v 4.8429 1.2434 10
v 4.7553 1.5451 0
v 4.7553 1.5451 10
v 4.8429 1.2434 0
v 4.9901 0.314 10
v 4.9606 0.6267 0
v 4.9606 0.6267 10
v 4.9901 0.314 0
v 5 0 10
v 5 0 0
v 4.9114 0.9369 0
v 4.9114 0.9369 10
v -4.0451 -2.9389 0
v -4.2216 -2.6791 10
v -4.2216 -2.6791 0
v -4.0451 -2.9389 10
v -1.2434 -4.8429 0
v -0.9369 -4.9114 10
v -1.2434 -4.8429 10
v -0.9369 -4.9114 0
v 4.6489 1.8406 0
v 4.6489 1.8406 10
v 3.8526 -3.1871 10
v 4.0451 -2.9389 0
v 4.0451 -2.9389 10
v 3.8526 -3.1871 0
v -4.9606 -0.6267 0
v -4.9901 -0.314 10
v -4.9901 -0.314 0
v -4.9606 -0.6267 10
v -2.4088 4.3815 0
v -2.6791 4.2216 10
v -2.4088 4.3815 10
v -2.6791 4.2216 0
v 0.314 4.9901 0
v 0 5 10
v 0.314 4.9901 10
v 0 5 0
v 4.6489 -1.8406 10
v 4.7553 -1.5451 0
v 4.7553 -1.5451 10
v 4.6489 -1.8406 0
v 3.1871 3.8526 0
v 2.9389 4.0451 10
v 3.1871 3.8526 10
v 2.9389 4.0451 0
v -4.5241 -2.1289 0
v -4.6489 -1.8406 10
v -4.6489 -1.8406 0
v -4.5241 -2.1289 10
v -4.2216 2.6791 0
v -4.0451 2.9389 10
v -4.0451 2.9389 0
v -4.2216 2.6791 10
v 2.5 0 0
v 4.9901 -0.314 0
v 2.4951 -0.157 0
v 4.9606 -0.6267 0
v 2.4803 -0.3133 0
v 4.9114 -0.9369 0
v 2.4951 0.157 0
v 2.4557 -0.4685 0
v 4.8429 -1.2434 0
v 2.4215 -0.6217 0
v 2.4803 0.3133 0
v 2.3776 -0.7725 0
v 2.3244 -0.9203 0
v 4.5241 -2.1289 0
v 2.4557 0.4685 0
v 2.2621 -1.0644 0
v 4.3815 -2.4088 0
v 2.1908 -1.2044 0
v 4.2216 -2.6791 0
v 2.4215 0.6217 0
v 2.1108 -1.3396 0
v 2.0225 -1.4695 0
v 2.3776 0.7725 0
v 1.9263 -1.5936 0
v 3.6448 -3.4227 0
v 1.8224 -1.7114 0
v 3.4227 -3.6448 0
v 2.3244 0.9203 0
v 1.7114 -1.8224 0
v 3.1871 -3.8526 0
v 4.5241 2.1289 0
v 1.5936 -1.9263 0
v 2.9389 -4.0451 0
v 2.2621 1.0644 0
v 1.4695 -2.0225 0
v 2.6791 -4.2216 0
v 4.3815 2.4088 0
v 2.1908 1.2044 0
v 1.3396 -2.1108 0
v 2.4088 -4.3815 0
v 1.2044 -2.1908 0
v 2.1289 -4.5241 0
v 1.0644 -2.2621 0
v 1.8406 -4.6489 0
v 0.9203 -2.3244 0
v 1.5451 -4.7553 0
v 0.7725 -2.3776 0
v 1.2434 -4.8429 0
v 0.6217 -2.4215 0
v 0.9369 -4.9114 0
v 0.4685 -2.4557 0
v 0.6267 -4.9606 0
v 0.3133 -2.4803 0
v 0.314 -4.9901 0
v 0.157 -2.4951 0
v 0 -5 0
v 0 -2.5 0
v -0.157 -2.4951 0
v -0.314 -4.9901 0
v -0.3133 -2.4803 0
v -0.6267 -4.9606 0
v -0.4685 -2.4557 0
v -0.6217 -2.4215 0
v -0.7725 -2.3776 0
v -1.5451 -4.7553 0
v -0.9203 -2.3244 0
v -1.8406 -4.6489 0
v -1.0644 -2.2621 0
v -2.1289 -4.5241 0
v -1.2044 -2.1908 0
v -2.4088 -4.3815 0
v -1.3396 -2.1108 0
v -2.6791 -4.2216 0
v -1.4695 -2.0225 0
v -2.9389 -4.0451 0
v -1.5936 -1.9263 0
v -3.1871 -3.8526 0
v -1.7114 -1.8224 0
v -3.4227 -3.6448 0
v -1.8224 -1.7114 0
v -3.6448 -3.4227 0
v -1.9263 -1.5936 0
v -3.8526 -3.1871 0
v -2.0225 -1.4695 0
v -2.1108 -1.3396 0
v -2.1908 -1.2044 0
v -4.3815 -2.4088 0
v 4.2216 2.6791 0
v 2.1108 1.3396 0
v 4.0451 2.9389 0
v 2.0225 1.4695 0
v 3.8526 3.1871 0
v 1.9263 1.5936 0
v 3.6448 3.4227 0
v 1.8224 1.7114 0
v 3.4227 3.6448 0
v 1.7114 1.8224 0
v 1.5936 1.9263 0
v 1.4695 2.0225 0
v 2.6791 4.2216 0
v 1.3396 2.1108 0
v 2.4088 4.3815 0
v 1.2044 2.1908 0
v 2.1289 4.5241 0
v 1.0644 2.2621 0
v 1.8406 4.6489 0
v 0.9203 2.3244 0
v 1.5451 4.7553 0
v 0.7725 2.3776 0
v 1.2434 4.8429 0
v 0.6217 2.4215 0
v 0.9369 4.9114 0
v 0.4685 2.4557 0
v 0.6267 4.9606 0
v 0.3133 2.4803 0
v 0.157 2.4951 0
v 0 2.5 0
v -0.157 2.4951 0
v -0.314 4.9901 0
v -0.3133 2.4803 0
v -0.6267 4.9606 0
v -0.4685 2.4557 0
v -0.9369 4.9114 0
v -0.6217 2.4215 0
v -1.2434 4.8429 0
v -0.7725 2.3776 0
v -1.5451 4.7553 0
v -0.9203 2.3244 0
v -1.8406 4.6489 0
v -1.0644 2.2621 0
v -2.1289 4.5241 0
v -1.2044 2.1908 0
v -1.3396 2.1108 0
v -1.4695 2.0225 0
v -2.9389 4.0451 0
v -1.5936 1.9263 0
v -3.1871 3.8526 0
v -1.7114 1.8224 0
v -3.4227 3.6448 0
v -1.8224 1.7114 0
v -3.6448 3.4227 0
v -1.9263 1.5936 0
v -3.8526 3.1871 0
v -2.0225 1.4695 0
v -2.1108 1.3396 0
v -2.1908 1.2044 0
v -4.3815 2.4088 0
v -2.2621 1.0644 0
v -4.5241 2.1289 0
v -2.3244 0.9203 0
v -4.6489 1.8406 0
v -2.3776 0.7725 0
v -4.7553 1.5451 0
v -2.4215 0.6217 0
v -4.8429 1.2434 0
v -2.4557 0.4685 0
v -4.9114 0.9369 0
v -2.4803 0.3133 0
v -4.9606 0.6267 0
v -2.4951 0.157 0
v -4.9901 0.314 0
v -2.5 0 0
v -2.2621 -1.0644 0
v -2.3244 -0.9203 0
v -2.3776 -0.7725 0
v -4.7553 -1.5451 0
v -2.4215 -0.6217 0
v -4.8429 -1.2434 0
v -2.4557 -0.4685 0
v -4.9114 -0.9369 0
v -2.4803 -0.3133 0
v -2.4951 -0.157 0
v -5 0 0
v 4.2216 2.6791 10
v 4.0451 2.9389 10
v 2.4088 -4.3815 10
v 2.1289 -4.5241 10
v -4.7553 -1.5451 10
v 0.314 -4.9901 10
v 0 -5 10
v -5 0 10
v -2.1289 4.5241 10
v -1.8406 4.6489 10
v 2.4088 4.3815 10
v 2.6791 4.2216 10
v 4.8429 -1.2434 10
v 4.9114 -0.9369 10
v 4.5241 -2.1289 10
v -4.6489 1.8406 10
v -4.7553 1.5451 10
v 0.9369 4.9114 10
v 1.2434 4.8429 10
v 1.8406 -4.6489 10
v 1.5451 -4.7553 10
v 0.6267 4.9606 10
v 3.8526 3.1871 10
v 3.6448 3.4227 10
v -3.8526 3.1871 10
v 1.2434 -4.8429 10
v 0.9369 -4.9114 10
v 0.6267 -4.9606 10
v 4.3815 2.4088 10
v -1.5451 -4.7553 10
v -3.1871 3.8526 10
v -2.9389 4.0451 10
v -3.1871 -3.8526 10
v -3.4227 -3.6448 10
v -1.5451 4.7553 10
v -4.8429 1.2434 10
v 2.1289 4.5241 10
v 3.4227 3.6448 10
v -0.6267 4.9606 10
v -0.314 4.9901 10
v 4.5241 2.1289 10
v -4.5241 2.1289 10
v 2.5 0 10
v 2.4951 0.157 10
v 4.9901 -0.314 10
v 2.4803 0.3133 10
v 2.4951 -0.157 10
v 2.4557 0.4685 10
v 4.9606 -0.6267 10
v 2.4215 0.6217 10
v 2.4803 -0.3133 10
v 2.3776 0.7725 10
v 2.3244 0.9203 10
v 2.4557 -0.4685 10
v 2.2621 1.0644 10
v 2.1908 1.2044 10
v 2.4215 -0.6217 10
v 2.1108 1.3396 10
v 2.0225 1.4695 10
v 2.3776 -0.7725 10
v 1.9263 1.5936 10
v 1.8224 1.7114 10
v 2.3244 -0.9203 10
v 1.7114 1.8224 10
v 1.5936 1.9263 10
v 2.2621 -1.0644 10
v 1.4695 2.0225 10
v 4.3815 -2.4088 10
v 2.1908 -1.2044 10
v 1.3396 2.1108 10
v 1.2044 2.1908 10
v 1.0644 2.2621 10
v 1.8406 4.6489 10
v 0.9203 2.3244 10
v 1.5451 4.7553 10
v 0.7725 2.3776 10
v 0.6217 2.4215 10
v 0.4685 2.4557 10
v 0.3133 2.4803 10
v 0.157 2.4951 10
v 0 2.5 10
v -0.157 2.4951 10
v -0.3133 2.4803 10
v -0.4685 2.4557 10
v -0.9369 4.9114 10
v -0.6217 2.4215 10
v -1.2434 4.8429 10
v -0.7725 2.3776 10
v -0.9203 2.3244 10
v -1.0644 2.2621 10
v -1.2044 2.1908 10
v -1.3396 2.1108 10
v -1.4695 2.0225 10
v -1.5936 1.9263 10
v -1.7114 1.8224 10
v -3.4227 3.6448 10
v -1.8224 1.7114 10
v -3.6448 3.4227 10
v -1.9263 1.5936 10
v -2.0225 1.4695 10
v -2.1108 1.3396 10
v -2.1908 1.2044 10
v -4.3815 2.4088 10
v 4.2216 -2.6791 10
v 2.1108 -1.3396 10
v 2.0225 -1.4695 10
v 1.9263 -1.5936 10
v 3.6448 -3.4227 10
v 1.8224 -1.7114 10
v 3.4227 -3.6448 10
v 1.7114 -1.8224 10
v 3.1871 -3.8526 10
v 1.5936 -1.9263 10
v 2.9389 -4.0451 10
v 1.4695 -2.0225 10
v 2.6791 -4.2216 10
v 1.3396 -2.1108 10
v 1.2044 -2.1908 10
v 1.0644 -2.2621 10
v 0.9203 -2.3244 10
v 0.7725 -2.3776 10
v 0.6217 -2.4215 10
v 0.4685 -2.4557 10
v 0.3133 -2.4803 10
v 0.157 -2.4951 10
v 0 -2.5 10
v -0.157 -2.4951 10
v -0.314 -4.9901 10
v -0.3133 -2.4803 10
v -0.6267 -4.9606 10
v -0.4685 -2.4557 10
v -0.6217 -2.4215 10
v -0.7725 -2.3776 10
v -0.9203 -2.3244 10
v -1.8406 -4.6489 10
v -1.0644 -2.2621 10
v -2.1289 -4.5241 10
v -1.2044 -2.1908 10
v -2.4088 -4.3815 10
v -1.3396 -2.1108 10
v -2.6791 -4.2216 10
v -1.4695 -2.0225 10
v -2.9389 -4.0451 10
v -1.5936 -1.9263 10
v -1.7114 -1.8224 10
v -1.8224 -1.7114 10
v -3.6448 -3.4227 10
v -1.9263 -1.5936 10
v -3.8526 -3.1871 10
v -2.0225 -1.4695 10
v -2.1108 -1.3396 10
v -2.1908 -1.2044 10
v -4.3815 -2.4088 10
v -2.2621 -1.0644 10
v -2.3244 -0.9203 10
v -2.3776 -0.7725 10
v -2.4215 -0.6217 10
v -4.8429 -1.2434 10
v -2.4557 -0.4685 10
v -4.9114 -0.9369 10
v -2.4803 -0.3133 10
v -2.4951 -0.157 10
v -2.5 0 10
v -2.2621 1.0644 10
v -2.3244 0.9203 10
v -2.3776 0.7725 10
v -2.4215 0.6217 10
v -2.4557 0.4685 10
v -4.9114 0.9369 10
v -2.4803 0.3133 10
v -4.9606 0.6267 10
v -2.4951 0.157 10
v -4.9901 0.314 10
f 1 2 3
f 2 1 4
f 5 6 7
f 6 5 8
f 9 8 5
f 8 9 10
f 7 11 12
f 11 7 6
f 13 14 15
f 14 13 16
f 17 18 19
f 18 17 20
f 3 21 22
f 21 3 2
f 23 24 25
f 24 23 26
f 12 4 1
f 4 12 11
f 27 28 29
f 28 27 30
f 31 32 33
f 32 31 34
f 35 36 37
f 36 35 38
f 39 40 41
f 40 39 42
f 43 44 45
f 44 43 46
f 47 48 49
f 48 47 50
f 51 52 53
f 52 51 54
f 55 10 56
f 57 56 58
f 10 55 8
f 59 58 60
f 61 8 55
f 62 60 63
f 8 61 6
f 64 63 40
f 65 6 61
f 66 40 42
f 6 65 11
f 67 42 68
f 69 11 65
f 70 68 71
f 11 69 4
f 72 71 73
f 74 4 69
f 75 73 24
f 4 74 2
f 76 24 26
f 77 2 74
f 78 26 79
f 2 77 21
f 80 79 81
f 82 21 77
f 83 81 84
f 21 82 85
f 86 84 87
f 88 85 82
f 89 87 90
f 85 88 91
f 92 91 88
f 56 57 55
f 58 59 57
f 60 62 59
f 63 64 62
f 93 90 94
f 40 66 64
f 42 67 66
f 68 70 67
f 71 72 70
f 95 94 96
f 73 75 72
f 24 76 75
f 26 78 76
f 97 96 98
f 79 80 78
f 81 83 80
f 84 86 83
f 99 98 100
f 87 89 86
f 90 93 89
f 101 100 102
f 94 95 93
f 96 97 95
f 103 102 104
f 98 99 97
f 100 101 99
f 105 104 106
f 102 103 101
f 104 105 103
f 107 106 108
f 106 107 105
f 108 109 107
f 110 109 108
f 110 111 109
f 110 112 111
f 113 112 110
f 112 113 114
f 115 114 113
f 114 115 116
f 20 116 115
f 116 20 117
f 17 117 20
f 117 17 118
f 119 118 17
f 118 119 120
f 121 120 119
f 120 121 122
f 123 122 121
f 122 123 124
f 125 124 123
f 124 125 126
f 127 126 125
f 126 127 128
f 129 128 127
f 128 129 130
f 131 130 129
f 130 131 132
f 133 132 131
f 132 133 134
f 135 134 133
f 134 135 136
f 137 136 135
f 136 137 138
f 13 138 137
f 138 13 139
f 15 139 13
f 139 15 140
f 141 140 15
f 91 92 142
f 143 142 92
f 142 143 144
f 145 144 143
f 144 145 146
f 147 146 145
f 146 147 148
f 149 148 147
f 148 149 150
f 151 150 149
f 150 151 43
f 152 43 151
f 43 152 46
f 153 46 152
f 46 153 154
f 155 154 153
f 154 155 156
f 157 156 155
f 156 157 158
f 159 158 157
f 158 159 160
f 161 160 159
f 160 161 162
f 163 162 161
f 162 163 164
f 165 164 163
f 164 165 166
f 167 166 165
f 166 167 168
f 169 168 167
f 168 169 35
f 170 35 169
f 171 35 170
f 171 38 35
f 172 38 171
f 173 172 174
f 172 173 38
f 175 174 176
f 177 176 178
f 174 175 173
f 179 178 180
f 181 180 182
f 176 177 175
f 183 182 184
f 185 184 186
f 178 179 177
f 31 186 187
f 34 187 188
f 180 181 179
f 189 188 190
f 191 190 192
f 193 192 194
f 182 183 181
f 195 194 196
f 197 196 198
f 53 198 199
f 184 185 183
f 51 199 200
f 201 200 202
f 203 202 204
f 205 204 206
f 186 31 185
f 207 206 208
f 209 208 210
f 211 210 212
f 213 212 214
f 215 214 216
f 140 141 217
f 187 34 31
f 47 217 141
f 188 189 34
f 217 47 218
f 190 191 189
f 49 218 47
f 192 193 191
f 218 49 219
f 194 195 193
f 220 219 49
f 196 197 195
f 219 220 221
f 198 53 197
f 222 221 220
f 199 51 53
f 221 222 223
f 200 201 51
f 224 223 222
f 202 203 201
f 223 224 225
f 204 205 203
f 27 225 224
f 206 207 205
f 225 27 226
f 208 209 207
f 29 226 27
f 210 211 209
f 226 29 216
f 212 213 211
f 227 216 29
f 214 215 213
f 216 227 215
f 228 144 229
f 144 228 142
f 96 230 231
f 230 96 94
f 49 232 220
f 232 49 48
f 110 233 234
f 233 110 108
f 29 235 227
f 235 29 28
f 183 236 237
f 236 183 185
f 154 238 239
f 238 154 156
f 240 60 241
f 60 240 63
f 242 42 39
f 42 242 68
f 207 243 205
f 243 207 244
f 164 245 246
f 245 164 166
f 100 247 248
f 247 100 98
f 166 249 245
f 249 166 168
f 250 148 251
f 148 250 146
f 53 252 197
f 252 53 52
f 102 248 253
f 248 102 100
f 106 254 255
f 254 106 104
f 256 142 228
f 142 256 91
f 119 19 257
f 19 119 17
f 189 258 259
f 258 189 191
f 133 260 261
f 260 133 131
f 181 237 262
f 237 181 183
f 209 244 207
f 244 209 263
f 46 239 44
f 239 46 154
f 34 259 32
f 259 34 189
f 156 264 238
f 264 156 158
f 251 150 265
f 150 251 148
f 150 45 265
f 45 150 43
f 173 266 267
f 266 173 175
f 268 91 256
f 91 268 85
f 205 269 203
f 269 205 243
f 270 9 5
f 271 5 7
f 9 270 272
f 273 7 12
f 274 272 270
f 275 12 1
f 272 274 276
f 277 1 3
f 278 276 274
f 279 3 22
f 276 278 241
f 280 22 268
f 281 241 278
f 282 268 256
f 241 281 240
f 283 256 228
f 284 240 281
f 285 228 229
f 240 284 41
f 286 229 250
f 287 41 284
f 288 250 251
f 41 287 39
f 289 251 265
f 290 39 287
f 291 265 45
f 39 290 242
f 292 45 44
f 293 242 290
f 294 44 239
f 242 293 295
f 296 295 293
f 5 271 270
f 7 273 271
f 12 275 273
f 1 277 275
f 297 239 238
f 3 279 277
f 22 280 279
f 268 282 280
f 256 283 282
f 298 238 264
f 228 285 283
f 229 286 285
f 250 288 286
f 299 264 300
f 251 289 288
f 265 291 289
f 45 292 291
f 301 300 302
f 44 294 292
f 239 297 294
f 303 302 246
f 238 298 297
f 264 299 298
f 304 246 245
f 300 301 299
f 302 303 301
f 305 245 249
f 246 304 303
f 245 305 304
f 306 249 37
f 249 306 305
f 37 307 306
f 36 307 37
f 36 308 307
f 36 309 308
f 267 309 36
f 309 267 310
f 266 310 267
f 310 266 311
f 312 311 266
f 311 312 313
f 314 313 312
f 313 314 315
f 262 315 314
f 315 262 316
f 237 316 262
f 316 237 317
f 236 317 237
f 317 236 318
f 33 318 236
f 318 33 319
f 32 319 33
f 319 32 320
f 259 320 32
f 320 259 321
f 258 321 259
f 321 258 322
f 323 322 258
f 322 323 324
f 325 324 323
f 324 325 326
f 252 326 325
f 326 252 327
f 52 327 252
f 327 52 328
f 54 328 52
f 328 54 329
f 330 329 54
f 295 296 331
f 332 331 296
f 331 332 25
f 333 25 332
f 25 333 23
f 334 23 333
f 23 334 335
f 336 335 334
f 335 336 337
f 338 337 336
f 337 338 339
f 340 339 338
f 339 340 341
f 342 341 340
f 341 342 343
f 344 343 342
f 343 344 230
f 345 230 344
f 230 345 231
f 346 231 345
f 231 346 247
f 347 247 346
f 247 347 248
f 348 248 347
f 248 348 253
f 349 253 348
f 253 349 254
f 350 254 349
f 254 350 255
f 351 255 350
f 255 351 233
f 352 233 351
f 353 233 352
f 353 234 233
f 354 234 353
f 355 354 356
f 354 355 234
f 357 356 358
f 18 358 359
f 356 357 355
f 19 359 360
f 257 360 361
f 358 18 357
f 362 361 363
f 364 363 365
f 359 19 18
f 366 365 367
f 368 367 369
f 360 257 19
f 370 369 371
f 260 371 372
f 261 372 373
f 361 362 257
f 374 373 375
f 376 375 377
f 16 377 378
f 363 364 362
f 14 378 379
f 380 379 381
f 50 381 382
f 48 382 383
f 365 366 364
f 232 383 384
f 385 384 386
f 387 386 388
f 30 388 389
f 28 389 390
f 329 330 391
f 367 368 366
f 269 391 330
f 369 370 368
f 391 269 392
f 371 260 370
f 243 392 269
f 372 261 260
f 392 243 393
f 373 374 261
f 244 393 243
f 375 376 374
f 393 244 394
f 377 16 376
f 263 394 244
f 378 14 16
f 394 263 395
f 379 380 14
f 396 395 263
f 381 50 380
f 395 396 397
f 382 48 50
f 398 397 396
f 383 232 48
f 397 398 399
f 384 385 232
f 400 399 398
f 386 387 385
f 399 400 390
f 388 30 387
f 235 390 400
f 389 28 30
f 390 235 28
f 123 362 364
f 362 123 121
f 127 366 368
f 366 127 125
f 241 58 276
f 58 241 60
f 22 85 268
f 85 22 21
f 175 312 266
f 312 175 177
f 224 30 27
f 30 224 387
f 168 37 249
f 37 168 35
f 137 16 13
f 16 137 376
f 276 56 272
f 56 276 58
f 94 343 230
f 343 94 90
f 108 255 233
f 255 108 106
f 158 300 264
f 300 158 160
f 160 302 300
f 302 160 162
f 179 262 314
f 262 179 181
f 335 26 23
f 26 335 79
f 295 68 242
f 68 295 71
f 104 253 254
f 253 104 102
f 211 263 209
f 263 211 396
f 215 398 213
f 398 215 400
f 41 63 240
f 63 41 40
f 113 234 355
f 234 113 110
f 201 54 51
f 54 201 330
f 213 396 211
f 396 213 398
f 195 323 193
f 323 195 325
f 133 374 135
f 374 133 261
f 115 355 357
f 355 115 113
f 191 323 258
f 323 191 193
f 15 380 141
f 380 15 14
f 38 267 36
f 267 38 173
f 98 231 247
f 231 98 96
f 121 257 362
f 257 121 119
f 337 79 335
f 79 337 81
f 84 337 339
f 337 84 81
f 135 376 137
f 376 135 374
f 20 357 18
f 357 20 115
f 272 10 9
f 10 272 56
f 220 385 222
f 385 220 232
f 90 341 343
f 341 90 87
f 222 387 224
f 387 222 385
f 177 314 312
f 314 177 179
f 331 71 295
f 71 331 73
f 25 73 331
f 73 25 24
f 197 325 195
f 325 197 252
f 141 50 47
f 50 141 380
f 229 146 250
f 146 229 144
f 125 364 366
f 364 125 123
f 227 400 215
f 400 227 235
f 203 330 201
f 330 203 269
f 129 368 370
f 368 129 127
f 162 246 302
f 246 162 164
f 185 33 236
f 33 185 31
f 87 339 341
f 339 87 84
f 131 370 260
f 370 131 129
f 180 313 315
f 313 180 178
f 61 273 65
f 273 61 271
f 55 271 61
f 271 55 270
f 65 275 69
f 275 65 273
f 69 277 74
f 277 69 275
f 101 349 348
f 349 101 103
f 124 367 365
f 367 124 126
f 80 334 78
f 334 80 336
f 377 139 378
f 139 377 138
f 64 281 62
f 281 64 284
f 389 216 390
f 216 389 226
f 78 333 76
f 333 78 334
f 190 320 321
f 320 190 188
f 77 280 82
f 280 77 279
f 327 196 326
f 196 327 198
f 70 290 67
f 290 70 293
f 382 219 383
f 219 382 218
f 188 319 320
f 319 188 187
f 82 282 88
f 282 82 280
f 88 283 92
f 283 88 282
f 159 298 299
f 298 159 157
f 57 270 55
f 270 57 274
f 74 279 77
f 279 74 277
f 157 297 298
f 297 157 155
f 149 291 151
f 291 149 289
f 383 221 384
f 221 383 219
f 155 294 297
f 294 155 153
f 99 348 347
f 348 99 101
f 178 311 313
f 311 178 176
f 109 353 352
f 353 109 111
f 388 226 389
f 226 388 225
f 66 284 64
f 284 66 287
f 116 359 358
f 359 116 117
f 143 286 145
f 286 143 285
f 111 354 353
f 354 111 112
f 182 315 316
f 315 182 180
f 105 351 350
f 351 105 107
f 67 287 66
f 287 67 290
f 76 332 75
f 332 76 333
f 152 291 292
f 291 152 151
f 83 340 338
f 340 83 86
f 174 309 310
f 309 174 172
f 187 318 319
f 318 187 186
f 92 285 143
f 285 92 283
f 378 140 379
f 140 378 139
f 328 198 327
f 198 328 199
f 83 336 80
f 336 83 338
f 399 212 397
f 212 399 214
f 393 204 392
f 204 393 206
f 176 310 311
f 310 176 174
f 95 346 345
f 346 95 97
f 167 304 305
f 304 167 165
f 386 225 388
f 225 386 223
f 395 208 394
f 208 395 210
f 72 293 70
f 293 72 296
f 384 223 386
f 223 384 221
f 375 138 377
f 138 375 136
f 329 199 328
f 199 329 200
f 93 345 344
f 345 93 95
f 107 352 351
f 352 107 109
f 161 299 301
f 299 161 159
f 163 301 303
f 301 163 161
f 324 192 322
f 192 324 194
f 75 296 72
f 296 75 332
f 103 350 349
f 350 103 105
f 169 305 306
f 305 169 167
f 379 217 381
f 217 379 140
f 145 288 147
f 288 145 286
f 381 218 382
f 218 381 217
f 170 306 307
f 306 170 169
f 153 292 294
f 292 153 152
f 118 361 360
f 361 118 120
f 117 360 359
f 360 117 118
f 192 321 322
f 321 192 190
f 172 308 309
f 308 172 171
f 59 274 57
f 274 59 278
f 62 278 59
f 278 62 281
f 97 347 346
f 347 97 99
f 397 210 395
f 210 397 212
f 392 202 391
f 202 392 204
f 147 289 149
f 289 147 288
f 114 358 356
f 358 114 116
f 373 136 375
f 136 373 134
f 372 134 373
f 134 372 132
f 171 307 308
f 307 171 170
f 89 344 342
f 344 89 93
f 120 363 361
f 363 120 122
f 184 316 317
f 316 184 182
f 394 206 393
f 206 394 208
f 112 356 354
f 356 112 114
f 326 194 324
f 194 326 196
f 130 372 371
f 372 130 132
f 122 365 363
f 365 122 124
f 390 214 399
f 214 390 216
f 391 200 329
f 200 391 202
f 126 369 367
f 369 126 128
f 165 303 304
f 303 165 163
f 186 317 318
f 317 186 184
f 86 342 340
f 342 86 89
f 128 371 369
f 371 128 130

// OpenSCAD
$fn = 100;

difference() {
    cylinder(d = 10, h = 10);
    translate([0, 0, -5])
        cylinder(d = 5, h = 20);
}
